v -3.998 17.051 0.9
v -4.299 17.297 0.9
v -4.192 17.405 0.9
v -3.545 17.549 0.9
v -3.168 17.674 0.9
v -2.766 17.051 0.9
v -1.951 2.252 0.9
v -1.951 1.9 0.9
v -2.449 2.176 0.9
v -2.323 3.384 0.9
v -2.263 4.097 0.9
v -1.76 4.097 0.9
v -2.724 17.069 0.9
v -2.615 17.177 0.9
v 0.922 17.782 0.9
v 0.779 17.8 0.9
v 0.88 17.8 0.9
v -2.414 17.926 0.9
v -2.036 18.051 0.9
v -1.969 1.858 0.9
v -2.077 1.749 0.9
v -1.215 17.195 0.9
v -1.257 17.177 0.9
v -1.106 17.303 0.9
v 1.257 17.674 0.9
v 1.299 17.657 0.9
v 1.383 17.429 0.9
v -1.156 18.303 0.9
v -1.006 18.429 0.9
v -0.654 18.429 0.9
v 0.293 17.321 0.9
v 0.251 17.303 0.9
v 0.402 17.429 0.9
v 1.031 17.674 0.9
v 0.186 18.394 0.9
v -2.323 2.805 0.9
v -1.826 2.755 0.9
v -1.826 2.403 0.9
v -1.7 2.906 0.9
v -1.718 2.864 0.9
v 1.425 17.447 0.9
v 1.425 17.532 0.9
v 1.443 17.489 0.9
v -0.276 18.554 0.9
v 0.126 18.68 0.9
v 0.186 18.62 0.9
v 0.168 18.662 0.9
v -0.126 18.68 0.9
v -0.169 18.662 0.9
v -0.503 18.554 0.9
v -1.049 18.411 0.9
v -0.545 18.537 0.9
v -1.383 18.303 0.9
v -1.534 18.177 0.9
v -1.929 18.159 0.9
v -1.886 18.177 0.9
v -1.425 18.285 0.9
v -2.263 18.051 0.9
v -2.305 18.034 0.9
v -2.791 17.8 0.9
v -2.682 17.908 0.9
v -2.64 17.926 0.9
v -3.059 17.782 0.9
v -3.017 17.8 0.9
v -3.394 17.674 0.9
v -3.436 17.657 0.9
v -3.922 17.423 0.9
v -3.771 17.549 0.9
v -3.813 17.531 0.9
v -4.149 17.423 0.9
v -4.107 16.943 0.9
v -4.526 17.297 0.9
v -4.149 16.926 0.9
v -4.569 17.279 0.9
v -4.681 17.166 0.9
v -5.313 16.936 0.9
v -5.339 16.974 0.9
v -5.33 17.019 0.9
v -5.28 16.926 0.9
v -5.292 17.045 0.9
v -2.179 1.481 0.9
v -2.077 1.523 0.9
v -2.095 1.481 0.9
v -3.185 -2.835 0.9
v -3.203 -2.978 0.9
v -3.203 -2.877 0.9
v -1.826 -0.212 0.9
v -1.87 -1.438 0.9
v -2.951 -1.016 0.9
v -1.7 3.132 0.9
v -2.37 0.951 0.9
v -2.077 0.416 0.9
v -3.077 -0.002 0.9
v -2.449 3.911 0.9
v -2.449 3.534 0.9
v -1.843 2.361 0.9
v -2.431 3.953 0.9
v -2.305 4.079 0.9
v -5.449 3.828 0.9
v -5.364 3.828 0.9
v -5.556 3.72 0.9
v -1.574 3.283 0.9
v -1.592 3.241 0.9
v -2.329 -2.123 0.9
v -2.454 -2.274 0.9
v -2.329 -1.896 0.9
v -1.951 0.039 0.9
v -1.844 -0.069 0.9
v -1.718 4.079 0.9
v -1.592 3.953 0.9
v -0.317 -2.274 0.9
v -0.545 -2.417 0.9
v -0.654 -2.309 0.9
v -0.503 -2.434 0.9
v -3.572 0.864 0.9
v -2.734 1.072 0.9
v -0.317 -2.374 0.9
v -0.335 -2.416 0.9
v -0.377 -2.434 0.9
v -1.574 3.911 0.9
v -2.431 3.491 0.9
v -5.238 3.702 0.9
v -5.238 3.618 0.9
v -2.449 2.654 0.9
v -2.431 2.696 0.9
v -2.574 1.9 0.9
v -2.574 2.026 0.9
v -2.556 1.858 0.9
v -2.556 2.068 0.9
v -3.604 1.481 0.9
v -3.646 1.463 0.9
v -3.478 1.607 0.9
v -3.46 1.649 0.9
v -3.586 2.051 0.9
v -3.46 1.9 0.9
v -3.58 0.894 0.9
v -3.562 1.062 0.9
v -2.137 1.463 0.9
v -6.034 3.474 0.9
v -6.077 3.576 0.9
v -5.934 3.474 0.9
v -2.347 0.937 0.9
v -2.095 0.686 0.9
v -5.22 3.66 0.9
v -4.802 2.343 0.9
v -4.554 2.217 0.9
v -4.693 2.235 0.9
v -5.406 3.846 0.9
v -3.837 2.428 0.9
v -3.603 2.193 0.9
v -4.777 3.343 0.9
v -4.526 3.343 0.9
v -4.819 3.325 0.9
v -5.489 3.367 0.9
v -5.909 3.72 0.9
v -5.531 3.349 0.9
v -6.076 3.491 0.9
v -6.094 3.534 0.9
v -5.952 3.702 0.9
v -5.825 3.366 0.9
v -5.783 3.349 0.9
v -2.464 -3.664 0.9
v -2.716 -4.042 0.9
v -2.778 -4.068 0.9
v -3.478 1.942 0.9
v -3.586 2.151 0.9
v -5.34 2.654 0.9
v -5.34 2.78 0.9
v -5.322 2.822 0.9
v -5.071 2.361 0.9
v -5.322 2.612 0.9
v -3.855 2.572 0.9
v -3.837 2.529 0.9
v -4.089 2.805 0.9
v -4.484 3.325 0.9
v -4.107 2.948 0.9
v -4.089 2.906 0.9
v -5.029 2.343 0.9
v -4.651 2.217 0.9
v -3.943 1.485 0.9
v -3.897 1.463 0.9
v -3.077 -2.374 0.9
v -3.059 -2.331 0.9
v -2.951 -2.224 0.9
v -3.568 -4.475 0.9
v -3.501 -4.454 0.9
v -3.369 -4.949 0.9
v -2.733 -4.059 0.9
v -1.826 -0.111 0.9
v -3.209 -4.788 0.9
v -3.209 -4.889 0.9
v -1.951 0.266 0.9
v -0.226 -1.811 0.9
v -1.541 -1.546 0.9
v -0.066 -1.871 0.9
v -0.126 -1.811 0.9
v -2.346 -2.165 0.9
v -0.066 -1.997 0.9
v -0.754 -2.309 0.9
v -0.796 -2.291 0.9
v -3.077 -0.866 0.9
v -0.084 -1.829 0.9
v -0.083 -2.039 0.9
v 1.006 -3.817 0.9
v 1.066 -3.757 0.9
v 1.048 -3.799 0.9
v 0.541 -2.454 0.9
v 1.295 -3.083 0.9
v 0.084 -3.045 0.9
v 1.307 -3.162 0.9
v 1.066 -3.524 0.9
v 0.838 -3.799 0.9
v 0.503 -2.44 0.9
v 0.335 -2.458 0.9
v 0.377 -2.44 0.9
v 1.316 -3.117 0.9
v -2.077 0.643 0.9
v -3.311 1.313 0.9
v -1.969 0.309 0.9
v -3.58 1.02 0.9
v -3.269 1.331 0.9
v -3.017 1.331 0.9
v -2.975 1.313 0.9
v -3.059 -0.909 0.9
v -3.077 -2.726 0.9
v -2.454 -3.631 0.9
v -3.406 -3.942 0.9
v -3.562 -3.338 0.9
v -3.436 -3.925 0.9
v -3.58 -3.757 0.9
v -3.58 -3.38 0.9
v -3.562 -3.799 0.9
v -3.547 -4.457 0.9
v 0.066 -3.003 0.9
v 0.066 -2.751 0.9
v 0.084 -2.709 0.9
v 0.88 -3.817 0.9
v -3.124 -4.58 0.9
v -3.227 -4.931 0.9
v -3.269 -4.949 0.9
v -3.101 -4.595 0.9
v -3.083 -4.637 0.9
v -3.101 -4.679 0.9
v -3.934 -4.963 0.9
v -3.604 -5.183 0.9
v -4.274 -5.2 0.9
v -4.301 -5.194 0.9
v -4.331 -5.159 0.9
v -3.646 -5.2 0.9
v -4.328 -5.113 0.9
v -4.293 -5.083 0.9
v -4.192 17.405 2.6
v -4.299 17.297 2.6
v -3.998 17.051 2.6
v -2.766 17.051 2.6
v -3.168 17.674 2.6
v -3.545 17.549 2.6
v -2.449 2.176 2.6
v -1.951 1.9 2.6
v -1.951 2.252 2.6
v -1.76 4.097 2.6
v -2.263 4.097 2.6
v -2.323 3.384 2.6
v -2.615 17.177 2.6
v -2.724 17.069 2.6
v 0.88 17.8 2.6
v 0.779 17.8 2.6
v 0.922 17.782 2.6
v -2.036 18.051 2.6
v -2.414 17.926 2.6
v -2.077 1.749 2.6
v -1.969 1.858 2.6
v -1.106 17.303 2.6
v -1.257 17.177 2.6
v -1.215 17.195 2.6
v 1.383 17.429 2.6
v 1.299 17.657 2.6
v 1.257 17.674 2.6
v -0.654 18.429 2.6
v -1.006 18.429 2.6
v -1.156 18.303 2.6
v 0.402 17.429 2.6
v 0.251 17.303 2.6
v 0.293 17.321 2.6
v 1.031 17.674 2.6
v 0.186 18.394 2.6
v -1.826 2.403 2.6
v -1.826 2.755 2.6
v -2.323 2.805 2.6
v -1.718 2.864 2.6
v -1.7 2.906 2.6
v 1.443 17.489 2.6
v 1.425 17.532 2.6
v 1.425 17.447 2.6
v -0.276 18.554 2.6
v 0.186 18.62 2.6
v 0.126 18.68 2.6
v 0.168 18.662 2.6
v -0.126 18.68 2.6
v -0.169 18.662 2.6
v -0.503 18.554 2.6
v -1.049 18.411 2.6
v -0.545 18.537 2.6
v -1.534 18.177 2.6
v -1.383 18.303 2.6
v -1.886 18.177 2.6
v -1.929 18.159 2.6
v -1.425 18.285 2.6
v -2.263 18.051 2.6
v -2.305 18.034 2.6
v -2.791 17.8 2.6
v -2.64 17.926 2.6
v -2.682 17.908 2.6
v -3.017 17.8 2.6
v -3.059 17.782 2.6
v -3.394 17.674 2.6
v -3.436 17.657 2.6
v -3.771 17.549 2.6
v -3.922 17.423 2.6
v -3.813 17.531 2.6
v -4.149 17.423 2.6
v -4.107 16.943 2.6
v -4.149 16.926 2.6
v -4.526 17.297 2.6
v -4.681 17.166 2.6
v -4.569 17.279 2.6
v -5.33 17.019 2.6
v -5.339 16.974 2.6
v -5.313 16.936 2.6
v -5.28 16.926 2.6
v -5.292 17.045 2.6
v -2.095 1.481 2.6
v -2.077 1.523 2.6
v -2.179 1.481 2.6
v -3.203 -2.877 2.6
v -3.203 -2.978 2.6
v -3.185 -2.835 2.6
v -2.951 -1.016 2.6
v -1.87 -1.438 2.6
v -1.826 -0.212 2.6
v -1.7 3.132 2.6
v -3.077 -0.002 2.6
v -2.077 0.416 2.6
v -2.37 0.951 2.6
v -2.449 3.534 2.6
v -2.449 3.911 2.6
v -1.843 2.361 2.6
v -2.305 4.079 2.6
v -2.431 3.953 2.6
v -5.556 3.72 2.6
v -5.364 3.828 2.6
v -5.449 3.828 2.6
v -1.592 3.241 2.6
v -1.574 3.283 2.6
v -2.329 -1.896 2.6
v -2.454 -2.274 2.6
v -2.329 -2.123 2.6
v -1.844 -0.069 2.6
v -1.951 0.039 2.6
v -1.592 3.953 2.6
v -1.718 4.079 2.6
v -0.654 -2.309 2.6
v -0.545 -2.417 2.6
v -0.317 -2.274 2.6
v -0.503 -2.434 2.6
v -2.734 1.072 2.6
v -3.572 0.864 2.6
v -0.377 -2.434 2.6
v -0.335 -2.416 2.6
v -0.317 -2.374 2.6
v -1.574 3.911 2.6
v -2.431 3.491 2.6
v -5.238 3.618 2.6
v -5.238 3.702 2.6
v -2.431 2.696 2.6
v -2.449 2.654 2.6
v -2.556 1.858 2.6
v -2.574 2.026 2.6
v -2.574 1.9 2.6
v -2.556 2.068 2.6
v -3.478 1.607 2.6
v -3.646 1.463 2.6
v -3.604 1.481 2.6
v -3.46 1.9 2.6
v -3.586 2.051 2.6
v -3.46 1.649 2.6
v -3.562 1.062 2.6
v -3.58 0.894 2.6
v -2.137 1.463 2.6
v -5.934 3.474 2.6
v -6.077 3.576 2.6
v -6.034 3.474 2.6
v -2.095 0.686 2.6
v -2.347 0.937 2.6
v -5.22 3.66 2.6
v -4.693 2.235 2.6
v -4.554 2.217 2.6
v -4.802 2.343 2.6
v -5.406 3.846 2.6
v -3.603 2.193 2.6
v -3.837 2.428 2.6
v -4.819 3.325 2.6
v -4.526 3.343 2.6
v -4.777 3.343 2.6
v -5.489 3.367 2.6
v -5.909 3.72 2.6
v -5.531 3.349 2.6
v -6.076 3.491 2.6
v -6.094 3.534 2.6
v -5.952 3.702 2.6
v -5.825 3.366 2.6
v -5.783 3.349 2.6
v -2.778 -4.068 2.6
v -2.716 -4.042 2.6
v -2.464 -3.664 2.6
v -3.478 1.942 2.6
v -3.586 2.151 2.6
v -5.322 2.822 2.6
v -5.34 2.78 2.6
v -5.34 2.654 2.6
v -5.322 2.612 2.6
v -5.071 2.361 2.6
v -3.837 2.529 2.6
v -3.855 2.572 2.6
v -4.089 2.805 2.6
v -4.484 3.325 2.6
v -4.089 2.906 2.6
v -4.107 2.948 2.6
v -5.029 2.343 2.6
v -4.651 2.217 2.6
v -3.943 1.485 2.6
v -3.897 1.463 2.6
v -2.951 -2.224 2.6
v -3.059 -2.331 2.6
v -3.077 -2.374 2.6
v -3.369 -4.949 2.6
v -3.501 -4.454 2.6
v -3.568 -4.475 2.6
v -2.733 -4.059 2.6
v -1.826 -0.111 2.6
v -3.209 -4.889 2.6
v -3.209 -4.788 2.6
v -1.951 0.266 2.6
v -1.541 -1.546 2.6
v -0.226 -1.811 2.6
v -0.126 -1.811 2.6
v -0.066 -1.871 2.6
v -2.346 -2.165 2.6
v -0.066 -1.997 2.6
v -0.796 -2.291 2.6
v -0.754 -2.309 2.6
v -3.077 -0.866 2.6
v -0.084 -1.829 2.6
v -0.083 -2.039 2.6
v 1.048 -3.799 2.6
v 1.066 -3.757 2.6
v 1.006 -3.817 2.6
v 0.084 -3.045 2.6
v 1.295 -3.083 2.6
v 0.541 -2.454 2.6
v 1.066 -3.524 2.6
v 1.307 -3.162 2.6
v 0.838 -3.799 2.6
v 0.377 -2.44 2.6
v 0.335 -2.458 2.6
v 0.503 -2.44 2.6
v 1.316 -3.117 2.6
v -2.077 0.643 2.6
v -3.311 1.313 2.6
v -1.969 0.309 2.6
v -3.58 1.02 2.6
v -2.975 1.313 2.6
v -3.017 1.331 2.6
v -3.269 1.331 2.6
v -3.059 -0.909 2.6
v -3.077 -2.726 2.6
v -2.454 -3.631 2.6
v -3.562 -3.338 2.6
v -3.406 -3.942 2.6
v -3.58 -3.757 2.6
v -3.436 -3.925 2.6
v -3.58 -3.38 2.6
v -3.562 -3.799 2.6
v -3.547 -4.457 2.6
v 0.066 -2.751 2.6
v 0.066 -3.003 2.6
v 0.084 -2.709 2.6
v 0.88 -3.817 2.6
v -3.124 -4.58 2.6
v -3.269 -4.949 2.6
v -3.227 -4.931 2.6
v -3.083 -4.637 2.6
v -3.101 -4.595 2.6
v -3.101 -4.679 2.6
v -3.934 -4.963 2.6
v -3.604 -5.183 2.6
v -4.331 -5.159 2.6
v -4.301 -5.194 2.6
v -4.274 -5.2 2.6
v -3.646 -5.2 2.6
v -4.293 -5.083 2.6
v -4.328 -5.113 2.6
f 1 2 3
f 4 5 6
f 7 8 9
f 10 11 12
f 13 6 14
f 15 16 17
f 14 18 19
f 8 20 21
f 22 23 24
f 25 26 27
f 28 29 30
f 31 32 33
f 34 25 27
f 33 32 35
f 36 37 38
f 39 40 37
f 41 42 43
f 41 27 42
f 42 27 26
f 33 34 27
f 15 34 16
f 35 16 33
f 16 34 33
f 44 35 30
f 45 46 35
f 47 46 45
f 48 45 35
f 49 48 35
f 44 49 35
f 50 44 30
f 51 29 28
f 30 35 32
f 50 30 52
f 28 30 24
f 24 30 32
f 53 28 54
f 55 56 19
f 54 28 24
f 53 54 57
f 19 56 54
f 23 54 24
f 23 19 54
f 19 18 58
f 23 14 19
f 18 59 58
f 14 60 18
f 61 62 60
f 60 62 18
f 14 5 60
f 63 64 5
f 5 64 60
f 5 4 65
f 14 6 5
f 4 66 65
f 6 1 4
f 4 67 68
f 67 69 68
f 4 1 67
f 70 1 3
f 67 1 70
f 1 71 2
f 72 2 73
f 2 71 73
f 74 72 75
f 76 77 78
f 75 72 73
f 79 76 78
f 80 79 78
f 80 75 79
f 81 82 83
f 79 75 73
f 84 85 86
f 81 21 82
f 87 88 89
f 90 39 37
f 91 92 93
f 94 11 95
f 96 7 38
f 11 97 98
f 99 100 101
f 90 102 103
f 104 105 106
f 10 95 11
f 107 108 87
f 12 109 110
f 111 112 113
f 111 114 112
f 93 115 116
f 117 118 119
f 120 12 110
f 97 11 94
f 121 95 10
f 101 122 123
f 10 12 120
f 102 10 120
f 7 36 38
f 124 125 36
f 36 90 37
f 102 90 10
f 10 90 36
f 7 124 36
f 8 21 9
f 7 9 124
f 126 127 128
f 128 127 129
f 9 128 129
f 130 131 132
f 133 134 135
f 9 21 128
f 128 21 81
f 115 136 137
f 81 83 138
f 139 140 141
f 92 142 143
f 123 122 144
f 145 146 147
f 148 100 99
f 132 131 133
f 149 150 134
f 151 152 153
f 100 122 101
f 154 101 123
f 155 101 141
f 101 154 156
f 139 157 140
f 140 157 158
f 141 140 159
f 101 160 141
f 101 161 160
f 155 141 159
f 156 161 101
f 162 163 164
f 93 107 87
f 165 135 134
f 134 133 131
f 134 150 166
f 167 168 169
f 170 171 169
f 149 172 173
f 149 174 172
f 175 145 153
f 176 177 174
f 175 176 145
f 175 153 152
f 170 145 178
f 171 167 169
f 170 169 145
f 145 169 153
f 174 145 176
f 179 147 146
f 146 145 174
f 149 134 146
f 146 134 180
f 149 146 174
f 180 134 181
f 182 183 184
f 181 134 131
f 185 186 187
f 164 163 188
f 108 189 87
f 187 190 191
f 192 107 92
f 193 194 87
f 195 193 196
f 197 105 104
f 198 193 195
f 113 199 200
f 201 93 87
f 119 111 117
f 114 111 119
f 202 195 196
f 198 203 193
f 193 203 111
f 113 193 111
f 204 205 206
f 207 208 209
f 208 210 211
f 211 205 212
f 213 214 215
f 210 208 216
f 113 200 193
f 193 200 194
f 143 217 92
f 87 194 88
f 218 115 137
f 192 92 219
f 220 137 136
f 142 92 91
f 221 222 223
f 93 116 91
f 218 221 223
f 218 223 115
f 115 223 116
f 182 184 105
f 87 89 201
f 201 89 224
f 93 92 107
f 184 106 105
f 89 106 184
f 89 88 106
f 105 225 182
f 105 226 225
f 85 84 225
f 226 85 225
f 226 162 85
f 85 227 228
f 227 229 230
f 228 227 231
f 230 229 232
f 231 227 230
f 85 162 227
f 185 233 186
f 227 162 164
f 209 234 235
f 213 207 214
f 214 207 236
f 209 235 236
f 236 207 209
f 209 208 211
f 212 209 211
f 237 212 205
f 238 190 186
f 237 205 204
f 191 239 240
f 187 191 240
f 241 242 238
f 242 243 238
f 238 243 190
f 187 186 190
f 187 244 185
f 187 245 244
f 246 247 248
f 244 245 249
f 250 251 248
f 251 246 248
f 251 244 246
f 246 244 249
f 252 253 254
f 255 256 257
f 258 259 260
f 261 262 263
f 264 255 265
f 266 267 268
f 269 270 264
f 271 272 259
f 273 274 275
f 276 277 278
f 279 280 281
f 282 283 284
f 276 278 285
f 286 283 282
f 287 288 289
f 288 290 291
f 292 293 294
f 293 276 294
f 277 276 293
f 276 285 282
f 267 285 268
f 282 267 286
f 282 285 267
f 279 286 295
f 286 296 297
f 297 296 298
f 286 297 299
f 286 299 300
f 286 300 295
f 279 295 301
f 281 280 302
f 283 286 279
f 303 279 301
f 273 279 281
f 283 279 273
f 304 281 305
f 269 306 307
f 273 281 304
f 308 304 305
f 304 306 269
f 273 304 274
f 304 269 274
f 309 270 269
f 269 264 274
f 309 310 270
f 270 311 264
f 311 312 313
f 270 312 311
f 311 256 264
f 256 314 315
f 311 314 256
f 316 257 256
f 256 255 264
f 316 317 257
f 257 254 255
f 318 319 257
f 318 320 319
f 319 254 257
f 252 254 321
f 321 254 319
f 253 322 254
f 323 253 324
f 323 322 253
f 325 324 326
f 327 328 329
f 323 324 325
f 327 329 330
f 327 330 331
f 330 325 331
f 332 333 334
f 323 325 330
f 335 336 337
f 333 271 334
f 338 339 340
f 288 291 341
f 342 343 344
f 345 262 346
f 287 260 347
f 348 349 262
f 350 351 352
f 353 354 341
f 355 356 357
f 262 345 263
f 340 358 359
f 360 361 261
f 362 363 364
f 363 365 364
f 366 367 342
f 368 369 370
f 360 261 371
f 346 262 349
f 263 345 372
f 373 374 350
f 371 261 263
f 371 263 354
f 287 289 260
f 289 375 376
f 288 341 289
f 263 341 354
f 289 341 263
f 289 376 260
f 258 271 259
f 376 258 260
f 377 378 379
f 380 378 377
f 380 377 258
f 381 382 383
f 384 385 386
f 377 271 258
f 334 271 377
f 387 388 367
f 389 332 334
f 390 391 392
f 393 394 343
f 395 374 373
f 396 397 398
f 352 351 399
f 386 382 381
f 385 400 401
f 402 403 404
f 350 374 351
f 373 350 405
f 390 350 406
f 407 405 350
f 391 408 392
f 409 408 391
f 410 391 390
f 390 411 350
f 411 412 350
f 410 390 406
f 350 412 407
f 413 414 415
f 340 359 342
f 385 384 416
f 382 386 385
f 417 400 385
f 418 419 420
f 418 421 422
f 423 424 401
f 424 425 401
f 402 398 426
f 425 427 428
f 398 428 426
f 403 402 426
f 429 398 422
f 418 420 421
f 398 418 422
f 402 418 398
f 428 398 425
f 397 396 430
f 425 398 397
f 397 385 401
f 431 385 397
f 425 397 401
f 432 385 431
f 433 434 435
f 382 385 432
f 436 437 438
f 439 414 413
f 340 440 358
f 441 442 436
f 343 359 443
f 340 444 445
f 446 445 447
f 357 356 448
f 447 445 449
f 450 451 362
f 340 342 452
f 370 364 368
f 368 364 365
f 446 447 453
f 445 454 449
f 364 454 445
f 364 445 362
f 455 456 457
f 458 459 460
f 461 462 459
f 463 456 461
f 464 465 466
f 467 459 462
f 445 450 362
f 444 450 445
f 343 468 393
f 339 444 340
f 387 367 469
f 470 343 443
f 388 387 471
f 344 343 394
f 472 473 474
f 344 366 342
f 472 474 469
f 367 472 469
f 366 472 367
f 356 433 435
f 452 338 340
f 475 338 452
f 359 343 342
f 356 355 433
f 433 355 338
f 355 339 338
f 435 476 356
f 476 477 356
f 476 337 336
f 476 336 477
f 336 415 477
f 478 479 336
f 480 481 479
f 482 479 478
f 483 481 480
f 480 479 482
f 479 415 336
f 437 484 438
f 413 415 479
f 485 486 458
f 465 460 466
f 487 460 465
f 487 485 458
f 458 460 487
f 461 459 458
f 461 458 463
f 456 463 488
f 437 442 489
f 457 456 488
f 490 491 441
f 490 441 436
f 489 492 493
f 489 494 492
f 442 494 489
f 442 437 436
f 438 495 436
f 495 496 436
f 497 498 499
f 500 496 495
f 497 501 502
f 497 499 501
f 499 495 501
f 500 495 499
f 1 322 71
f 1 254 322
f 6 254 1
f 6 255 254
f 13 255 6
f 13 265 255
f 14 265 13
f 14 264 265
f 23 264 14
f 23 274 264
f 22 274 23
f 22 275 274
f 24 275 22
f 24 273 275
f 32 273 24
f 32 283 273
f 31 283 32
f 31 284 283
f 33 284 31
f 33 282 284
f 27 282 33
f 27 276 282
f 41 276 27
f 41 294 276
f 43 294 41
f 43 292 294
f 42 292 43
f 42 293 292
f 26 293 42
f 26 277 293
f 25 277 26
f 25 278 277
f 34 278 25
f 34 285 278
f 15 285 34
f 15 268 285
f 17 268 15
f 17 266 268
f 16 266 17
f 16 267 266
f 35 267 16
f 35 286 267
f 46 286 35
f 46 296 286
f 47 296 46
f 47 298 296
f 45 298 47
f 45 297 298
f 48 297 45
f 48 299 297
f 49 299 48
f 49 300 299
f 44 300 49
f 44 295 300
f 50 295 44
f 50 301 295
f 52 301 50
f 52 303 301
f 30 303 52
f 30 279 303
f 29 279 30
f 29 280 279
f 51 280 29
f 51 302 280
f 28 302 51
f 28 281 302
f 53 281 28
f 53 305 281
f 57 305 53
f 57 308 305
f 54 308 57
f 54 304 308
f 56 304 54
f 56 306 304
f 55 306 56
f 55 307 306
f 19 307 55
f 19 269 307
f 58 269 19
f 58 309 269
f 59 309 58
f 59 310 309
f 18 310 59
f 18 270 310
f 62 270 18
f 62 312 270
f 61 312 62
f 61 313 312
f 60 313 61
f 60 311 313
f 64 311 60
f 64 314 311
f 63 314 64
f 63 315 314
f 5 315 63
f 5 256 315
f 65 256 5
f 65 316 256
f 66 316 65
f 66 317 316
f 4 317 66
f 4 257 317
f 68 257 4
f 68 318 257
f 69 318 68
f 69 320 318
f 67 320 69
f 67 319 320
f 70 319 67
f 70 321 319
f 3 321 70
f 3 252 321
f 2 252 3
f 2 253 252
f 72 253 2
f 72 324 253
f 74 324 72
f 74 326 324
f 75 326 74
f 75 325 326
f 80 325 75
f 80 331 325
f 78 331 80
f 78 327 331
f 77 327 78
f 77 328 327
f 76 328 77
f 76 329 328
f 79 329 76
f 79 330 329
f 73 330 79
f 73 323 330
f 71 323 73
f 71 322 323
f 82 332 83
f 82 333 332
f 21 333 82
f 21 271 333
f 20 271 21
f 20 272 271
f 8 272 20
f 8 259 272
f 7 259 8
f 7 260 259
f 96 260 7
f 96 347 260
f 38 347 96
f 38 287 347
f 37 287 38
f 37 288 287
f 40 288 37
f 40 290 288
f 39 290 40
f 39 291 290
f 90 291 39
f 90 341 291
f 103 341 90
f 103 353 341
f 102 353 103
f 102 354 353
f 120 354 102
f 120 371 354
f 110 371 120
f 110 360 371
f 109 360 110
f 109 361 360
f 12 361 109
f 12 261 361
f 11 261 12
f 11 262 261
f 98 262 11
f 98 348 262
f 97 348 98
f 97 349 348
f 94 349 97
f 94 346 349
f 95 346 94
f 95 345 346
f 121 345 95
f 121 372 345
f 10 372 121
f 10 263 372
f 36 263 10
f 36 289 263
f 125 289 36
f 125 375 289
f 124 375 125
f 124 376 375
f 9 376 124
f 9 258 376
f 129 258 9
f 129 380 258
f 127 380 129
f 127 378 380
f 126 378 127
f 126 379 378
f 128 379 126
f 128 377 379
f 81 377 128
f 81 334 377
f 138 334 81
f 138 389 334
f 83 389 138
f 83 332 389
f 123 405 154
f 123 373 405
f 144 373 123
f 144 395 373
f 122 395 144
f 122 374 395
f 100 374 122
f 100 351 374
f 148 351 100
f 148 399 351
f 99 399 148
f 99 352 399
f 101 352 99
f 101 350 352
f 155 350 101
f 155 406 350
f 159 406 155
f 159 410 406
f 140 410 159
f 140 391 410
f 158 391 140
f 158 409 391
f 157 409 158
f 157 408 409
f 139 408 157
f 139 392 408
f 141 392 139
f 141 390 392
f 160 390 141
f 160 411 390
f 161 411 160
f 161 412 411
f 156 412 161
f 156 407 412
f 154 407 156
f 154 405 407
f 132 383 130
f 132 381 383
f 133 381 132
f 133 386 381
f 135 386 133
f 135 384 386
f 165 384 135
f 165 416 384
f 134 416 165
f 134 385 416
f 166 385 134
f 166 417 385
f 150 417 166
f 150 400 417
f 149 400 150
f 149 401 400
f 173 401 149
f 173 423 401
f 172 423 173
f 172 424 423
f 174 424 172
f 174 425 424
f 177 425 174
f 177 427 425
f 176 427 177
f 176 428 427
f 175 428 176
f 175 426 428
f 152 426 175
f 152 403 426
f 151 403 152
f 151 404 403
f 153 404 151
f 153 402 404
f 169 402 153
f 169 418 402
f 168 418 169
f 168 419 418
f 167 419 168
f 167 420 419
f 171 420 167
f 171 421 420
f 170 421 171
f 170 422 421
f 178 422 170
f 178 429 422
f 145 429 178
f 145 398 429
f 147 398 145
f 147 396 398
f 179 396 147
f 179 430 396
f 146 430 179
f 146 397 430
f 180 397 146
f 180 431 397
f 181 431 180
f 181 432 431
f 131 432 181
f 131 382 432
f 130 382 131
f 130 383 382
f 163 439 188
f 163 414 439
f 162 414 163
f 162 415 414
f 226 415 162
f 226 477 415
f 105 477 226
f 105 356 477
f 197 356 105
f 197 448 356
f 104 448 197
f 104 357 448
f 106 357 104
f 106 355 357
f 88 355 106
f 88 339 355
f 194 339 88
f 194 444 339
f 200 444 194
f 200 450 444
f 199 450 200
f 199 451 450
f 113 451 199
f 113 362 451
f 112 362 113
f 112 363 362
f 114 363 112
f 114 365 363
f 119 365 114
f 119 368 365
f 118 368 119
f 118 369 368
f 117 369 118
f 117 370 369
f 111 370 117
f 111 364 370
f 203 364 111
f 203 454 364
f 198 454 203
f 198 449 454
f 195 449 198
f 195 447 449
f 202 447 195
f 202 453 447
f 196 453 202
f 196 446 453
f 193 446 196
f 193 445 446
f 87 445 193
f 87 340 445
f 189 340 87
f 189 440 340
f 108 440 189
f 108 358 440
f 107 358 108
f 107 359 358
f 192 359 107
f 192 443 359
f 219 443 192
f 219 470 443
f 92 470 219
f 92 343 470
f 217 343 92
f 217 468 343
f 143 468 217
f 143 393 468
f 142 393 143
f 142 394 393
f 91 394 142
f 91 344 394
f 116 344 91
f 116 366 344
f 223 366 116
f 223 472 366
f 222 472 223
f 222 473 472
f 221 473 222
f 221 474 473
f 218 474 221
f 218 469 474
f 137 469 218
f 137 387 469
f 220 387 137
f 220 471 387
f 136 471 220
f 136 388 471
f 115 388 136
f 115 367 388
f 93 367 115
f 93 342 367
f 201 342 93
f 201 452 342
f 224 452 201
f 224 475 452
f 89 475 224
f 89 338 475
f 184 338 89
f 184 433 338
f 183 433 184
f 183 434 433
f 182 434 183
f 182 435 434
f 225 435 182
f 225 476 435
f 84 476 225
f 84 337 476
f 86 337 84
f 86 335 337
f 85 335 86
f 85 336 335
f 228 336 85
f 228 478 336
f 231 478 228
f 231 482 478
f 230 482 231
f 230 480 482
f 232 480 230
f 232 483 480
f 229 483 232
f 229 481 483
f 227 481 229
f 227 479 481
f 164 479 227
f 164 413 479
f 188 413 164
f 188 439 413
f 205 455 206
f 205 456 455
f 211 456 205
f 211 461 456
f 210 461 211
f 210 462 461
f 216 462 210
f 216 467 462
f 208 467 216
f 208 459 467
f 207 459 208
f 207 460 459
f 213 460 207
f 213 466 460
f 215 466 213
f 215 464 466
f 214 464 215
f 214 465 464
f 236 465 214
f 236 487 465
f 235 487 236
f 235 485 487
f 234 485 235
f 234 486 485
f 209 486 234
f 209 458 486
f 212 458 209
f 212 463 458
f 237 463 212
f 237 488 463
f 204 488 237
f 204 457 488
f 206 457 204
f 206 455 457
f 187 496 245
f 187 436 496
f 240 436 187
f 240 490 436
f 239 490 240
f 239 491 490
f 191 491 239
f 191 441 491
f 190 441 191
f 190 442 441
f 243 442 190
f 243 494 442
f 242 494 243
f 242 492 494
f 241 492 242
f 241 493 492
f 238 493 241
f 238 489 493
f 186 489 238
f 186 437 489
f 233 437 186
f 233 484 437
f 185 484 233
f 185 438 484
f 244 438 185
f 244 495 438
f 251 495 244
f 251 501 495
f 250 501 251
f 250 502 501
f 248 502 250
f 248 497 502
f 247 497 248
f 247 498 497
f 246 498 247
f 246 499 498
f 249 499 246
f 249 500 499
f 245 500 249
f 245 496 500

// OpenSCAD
$fn = 24;
translate([0, -2.500, 0.900])
  linear_extrude(height=1.700) {
offset(r=0.06, $fn=8) {
    polygon(points=[[-3.143,-2.137],[-3.520,-2.011],[-3.897,-2.514],[-4.274,-2.640],[-3.646,-2.640],[-3.394,-2.389],[-3.269,-2.389],[-3.269,-2.263]], paths=[[0,1,2,3,4,5,6,7]]);
    polygon(points=[[0.377,0.000],[0.126,-0.251],[0.126,-0.503],[0.880,-1.257],[1.006,-1.257],[1.006,-1.006],[1.257,-0.629],[0.503,0.000]], paths=[[0,1,2,3,4,5,6,7]]);
    polygon(points=[[-3.269,3.771],[-3.520,3.520],[-3.520,3.394],[-3.017,2.514],[-3.017,1.634],[-2.891,1.509],[-2.891,0.251],[-3.017,0.126],[-3.017,-0.251],[-3.143,-0.377],[-3.143,-0.503],[-3.520,-0.880],[-3.520,-1.257],[-3.394,-1.383],[-2.766,-1.509],[-2.514,-1.131],[-2.514,0.251],[-2.389,0.377],[-2.389,0.629],[-1.886,1.131],[-1.509,1.006],[-0.754,0.251],[-0.629,0.251],[-0.503,0.126],[-0.377,0.126],[-0.377,0.251],[-0.126,0.503],[-0.126,0.629],[-0.251,0.629],[-1.886,2.263],[-1.886,2.389],[-2.011,2.514],[-2.011,2.766],[-2.137,2.891],[-2.137,3.143],[-2.389,3.394],[-2.766,3.520],[-3.017,3.771]], paths=[[0,1,2,3,4,5,6,7,8,9,10,11,12,13,14,15,16,17,18,19,20,21,22,23,24,25,26,27,28,29,30,31,32,33,34,35,36,37]]);
    polygon(points=[[-4.777,5.783],[-5.280,5.280],[-5.280,5.154],[-5.029,4.903],[-4.777,4.903],[-4.651,4.777],[-4.526,4.777],[-3.897,4.023],[-3.646,4.023],[-3.520,4.149],[-3.520,4.400],[-3.646,4.526],[-3.646,4.651],[-3.897,4.903],[-3.897,5.029],[-4.149,5.280],[-4.149,5.406],[-4.526,5.783]], paths=[[0,1,2,3,4,5,6,7,8,9,10,11,12,13,14,15,16,17]]);
    polygon(points=[[-5.280,6.160],[-5.406,6.286],[-5.531,6.160],[-5.909,6.160],[-6.034,6.034],[-5.909,6.034],[-5.783,5.909],[-5.531,5.909]], paths=[[0,1,2,3,4,5,6,7]]);
    polygon(points=[[-1.760,6.537],[-2.263,6.537],[-2.389,6.411],[-2.389,6.034],[-2.263,5.909],[-2.263,5.280],[-2.389,5.154],[-2.389,4.651],[-2.514,4.526],[-2.514,4.400],[-2.137,4.023],[-2.137,4.274],[-2.011,4.400],[-2.011,4.777],[-1.886,4.903],[-1.886,5.280],[-1.760,5.406],[-1.760,5.657],[-1.634,5.783],[-1.634,6.411]], paths=[[0,1,2,3,4,5,6,7,8,9,10,11,12,13,14,15,16,17,18,19]]);
    polygon(points=[[1.383,19.989],[1.257,20.114],[1.006,20.114],[0.880,20.240],[0.754,20.240],[0.126,20.869],[0.126,21.120],[-0.126,21.120],[-0.251,20.994],[-0.503,20.994],[-0.629,20.869],[-1.006,20.869],[-1.131,20.743],[-1.383,20.743],[-1.509,20.617],[-1.886,20.617],[-2.011,20.491],[-2.263,20.491],[-2.389,20.366],[-2.640,20.366],[-2.766,20.240],[-3.017,20.240],[-3.143,20.114],[-3.394,20.114],[-3.520,19.989],[-3.771,19.989],[-3.897,19.863],[-4.149,19.863],[-4.274,19.737],[-4.526,19.737],[-4.651,19.611],[-5.280,19.486],[-4.149,19.486],[-4.023,19.611],[-2.766,19.611],[-2.640,19.737],[-1.257,19.737],[-1.131,19.863],[0.251,19.863],[0.377,19.989]], paths=[[0,1,2,3,4,5,6,7,8,9,10,11,12,13,14,15,16,17,18,19,20,21,22,23,24,25,26,27,28,29,30,31,32,33,34,35,36,37,38,39]]);
}
}
